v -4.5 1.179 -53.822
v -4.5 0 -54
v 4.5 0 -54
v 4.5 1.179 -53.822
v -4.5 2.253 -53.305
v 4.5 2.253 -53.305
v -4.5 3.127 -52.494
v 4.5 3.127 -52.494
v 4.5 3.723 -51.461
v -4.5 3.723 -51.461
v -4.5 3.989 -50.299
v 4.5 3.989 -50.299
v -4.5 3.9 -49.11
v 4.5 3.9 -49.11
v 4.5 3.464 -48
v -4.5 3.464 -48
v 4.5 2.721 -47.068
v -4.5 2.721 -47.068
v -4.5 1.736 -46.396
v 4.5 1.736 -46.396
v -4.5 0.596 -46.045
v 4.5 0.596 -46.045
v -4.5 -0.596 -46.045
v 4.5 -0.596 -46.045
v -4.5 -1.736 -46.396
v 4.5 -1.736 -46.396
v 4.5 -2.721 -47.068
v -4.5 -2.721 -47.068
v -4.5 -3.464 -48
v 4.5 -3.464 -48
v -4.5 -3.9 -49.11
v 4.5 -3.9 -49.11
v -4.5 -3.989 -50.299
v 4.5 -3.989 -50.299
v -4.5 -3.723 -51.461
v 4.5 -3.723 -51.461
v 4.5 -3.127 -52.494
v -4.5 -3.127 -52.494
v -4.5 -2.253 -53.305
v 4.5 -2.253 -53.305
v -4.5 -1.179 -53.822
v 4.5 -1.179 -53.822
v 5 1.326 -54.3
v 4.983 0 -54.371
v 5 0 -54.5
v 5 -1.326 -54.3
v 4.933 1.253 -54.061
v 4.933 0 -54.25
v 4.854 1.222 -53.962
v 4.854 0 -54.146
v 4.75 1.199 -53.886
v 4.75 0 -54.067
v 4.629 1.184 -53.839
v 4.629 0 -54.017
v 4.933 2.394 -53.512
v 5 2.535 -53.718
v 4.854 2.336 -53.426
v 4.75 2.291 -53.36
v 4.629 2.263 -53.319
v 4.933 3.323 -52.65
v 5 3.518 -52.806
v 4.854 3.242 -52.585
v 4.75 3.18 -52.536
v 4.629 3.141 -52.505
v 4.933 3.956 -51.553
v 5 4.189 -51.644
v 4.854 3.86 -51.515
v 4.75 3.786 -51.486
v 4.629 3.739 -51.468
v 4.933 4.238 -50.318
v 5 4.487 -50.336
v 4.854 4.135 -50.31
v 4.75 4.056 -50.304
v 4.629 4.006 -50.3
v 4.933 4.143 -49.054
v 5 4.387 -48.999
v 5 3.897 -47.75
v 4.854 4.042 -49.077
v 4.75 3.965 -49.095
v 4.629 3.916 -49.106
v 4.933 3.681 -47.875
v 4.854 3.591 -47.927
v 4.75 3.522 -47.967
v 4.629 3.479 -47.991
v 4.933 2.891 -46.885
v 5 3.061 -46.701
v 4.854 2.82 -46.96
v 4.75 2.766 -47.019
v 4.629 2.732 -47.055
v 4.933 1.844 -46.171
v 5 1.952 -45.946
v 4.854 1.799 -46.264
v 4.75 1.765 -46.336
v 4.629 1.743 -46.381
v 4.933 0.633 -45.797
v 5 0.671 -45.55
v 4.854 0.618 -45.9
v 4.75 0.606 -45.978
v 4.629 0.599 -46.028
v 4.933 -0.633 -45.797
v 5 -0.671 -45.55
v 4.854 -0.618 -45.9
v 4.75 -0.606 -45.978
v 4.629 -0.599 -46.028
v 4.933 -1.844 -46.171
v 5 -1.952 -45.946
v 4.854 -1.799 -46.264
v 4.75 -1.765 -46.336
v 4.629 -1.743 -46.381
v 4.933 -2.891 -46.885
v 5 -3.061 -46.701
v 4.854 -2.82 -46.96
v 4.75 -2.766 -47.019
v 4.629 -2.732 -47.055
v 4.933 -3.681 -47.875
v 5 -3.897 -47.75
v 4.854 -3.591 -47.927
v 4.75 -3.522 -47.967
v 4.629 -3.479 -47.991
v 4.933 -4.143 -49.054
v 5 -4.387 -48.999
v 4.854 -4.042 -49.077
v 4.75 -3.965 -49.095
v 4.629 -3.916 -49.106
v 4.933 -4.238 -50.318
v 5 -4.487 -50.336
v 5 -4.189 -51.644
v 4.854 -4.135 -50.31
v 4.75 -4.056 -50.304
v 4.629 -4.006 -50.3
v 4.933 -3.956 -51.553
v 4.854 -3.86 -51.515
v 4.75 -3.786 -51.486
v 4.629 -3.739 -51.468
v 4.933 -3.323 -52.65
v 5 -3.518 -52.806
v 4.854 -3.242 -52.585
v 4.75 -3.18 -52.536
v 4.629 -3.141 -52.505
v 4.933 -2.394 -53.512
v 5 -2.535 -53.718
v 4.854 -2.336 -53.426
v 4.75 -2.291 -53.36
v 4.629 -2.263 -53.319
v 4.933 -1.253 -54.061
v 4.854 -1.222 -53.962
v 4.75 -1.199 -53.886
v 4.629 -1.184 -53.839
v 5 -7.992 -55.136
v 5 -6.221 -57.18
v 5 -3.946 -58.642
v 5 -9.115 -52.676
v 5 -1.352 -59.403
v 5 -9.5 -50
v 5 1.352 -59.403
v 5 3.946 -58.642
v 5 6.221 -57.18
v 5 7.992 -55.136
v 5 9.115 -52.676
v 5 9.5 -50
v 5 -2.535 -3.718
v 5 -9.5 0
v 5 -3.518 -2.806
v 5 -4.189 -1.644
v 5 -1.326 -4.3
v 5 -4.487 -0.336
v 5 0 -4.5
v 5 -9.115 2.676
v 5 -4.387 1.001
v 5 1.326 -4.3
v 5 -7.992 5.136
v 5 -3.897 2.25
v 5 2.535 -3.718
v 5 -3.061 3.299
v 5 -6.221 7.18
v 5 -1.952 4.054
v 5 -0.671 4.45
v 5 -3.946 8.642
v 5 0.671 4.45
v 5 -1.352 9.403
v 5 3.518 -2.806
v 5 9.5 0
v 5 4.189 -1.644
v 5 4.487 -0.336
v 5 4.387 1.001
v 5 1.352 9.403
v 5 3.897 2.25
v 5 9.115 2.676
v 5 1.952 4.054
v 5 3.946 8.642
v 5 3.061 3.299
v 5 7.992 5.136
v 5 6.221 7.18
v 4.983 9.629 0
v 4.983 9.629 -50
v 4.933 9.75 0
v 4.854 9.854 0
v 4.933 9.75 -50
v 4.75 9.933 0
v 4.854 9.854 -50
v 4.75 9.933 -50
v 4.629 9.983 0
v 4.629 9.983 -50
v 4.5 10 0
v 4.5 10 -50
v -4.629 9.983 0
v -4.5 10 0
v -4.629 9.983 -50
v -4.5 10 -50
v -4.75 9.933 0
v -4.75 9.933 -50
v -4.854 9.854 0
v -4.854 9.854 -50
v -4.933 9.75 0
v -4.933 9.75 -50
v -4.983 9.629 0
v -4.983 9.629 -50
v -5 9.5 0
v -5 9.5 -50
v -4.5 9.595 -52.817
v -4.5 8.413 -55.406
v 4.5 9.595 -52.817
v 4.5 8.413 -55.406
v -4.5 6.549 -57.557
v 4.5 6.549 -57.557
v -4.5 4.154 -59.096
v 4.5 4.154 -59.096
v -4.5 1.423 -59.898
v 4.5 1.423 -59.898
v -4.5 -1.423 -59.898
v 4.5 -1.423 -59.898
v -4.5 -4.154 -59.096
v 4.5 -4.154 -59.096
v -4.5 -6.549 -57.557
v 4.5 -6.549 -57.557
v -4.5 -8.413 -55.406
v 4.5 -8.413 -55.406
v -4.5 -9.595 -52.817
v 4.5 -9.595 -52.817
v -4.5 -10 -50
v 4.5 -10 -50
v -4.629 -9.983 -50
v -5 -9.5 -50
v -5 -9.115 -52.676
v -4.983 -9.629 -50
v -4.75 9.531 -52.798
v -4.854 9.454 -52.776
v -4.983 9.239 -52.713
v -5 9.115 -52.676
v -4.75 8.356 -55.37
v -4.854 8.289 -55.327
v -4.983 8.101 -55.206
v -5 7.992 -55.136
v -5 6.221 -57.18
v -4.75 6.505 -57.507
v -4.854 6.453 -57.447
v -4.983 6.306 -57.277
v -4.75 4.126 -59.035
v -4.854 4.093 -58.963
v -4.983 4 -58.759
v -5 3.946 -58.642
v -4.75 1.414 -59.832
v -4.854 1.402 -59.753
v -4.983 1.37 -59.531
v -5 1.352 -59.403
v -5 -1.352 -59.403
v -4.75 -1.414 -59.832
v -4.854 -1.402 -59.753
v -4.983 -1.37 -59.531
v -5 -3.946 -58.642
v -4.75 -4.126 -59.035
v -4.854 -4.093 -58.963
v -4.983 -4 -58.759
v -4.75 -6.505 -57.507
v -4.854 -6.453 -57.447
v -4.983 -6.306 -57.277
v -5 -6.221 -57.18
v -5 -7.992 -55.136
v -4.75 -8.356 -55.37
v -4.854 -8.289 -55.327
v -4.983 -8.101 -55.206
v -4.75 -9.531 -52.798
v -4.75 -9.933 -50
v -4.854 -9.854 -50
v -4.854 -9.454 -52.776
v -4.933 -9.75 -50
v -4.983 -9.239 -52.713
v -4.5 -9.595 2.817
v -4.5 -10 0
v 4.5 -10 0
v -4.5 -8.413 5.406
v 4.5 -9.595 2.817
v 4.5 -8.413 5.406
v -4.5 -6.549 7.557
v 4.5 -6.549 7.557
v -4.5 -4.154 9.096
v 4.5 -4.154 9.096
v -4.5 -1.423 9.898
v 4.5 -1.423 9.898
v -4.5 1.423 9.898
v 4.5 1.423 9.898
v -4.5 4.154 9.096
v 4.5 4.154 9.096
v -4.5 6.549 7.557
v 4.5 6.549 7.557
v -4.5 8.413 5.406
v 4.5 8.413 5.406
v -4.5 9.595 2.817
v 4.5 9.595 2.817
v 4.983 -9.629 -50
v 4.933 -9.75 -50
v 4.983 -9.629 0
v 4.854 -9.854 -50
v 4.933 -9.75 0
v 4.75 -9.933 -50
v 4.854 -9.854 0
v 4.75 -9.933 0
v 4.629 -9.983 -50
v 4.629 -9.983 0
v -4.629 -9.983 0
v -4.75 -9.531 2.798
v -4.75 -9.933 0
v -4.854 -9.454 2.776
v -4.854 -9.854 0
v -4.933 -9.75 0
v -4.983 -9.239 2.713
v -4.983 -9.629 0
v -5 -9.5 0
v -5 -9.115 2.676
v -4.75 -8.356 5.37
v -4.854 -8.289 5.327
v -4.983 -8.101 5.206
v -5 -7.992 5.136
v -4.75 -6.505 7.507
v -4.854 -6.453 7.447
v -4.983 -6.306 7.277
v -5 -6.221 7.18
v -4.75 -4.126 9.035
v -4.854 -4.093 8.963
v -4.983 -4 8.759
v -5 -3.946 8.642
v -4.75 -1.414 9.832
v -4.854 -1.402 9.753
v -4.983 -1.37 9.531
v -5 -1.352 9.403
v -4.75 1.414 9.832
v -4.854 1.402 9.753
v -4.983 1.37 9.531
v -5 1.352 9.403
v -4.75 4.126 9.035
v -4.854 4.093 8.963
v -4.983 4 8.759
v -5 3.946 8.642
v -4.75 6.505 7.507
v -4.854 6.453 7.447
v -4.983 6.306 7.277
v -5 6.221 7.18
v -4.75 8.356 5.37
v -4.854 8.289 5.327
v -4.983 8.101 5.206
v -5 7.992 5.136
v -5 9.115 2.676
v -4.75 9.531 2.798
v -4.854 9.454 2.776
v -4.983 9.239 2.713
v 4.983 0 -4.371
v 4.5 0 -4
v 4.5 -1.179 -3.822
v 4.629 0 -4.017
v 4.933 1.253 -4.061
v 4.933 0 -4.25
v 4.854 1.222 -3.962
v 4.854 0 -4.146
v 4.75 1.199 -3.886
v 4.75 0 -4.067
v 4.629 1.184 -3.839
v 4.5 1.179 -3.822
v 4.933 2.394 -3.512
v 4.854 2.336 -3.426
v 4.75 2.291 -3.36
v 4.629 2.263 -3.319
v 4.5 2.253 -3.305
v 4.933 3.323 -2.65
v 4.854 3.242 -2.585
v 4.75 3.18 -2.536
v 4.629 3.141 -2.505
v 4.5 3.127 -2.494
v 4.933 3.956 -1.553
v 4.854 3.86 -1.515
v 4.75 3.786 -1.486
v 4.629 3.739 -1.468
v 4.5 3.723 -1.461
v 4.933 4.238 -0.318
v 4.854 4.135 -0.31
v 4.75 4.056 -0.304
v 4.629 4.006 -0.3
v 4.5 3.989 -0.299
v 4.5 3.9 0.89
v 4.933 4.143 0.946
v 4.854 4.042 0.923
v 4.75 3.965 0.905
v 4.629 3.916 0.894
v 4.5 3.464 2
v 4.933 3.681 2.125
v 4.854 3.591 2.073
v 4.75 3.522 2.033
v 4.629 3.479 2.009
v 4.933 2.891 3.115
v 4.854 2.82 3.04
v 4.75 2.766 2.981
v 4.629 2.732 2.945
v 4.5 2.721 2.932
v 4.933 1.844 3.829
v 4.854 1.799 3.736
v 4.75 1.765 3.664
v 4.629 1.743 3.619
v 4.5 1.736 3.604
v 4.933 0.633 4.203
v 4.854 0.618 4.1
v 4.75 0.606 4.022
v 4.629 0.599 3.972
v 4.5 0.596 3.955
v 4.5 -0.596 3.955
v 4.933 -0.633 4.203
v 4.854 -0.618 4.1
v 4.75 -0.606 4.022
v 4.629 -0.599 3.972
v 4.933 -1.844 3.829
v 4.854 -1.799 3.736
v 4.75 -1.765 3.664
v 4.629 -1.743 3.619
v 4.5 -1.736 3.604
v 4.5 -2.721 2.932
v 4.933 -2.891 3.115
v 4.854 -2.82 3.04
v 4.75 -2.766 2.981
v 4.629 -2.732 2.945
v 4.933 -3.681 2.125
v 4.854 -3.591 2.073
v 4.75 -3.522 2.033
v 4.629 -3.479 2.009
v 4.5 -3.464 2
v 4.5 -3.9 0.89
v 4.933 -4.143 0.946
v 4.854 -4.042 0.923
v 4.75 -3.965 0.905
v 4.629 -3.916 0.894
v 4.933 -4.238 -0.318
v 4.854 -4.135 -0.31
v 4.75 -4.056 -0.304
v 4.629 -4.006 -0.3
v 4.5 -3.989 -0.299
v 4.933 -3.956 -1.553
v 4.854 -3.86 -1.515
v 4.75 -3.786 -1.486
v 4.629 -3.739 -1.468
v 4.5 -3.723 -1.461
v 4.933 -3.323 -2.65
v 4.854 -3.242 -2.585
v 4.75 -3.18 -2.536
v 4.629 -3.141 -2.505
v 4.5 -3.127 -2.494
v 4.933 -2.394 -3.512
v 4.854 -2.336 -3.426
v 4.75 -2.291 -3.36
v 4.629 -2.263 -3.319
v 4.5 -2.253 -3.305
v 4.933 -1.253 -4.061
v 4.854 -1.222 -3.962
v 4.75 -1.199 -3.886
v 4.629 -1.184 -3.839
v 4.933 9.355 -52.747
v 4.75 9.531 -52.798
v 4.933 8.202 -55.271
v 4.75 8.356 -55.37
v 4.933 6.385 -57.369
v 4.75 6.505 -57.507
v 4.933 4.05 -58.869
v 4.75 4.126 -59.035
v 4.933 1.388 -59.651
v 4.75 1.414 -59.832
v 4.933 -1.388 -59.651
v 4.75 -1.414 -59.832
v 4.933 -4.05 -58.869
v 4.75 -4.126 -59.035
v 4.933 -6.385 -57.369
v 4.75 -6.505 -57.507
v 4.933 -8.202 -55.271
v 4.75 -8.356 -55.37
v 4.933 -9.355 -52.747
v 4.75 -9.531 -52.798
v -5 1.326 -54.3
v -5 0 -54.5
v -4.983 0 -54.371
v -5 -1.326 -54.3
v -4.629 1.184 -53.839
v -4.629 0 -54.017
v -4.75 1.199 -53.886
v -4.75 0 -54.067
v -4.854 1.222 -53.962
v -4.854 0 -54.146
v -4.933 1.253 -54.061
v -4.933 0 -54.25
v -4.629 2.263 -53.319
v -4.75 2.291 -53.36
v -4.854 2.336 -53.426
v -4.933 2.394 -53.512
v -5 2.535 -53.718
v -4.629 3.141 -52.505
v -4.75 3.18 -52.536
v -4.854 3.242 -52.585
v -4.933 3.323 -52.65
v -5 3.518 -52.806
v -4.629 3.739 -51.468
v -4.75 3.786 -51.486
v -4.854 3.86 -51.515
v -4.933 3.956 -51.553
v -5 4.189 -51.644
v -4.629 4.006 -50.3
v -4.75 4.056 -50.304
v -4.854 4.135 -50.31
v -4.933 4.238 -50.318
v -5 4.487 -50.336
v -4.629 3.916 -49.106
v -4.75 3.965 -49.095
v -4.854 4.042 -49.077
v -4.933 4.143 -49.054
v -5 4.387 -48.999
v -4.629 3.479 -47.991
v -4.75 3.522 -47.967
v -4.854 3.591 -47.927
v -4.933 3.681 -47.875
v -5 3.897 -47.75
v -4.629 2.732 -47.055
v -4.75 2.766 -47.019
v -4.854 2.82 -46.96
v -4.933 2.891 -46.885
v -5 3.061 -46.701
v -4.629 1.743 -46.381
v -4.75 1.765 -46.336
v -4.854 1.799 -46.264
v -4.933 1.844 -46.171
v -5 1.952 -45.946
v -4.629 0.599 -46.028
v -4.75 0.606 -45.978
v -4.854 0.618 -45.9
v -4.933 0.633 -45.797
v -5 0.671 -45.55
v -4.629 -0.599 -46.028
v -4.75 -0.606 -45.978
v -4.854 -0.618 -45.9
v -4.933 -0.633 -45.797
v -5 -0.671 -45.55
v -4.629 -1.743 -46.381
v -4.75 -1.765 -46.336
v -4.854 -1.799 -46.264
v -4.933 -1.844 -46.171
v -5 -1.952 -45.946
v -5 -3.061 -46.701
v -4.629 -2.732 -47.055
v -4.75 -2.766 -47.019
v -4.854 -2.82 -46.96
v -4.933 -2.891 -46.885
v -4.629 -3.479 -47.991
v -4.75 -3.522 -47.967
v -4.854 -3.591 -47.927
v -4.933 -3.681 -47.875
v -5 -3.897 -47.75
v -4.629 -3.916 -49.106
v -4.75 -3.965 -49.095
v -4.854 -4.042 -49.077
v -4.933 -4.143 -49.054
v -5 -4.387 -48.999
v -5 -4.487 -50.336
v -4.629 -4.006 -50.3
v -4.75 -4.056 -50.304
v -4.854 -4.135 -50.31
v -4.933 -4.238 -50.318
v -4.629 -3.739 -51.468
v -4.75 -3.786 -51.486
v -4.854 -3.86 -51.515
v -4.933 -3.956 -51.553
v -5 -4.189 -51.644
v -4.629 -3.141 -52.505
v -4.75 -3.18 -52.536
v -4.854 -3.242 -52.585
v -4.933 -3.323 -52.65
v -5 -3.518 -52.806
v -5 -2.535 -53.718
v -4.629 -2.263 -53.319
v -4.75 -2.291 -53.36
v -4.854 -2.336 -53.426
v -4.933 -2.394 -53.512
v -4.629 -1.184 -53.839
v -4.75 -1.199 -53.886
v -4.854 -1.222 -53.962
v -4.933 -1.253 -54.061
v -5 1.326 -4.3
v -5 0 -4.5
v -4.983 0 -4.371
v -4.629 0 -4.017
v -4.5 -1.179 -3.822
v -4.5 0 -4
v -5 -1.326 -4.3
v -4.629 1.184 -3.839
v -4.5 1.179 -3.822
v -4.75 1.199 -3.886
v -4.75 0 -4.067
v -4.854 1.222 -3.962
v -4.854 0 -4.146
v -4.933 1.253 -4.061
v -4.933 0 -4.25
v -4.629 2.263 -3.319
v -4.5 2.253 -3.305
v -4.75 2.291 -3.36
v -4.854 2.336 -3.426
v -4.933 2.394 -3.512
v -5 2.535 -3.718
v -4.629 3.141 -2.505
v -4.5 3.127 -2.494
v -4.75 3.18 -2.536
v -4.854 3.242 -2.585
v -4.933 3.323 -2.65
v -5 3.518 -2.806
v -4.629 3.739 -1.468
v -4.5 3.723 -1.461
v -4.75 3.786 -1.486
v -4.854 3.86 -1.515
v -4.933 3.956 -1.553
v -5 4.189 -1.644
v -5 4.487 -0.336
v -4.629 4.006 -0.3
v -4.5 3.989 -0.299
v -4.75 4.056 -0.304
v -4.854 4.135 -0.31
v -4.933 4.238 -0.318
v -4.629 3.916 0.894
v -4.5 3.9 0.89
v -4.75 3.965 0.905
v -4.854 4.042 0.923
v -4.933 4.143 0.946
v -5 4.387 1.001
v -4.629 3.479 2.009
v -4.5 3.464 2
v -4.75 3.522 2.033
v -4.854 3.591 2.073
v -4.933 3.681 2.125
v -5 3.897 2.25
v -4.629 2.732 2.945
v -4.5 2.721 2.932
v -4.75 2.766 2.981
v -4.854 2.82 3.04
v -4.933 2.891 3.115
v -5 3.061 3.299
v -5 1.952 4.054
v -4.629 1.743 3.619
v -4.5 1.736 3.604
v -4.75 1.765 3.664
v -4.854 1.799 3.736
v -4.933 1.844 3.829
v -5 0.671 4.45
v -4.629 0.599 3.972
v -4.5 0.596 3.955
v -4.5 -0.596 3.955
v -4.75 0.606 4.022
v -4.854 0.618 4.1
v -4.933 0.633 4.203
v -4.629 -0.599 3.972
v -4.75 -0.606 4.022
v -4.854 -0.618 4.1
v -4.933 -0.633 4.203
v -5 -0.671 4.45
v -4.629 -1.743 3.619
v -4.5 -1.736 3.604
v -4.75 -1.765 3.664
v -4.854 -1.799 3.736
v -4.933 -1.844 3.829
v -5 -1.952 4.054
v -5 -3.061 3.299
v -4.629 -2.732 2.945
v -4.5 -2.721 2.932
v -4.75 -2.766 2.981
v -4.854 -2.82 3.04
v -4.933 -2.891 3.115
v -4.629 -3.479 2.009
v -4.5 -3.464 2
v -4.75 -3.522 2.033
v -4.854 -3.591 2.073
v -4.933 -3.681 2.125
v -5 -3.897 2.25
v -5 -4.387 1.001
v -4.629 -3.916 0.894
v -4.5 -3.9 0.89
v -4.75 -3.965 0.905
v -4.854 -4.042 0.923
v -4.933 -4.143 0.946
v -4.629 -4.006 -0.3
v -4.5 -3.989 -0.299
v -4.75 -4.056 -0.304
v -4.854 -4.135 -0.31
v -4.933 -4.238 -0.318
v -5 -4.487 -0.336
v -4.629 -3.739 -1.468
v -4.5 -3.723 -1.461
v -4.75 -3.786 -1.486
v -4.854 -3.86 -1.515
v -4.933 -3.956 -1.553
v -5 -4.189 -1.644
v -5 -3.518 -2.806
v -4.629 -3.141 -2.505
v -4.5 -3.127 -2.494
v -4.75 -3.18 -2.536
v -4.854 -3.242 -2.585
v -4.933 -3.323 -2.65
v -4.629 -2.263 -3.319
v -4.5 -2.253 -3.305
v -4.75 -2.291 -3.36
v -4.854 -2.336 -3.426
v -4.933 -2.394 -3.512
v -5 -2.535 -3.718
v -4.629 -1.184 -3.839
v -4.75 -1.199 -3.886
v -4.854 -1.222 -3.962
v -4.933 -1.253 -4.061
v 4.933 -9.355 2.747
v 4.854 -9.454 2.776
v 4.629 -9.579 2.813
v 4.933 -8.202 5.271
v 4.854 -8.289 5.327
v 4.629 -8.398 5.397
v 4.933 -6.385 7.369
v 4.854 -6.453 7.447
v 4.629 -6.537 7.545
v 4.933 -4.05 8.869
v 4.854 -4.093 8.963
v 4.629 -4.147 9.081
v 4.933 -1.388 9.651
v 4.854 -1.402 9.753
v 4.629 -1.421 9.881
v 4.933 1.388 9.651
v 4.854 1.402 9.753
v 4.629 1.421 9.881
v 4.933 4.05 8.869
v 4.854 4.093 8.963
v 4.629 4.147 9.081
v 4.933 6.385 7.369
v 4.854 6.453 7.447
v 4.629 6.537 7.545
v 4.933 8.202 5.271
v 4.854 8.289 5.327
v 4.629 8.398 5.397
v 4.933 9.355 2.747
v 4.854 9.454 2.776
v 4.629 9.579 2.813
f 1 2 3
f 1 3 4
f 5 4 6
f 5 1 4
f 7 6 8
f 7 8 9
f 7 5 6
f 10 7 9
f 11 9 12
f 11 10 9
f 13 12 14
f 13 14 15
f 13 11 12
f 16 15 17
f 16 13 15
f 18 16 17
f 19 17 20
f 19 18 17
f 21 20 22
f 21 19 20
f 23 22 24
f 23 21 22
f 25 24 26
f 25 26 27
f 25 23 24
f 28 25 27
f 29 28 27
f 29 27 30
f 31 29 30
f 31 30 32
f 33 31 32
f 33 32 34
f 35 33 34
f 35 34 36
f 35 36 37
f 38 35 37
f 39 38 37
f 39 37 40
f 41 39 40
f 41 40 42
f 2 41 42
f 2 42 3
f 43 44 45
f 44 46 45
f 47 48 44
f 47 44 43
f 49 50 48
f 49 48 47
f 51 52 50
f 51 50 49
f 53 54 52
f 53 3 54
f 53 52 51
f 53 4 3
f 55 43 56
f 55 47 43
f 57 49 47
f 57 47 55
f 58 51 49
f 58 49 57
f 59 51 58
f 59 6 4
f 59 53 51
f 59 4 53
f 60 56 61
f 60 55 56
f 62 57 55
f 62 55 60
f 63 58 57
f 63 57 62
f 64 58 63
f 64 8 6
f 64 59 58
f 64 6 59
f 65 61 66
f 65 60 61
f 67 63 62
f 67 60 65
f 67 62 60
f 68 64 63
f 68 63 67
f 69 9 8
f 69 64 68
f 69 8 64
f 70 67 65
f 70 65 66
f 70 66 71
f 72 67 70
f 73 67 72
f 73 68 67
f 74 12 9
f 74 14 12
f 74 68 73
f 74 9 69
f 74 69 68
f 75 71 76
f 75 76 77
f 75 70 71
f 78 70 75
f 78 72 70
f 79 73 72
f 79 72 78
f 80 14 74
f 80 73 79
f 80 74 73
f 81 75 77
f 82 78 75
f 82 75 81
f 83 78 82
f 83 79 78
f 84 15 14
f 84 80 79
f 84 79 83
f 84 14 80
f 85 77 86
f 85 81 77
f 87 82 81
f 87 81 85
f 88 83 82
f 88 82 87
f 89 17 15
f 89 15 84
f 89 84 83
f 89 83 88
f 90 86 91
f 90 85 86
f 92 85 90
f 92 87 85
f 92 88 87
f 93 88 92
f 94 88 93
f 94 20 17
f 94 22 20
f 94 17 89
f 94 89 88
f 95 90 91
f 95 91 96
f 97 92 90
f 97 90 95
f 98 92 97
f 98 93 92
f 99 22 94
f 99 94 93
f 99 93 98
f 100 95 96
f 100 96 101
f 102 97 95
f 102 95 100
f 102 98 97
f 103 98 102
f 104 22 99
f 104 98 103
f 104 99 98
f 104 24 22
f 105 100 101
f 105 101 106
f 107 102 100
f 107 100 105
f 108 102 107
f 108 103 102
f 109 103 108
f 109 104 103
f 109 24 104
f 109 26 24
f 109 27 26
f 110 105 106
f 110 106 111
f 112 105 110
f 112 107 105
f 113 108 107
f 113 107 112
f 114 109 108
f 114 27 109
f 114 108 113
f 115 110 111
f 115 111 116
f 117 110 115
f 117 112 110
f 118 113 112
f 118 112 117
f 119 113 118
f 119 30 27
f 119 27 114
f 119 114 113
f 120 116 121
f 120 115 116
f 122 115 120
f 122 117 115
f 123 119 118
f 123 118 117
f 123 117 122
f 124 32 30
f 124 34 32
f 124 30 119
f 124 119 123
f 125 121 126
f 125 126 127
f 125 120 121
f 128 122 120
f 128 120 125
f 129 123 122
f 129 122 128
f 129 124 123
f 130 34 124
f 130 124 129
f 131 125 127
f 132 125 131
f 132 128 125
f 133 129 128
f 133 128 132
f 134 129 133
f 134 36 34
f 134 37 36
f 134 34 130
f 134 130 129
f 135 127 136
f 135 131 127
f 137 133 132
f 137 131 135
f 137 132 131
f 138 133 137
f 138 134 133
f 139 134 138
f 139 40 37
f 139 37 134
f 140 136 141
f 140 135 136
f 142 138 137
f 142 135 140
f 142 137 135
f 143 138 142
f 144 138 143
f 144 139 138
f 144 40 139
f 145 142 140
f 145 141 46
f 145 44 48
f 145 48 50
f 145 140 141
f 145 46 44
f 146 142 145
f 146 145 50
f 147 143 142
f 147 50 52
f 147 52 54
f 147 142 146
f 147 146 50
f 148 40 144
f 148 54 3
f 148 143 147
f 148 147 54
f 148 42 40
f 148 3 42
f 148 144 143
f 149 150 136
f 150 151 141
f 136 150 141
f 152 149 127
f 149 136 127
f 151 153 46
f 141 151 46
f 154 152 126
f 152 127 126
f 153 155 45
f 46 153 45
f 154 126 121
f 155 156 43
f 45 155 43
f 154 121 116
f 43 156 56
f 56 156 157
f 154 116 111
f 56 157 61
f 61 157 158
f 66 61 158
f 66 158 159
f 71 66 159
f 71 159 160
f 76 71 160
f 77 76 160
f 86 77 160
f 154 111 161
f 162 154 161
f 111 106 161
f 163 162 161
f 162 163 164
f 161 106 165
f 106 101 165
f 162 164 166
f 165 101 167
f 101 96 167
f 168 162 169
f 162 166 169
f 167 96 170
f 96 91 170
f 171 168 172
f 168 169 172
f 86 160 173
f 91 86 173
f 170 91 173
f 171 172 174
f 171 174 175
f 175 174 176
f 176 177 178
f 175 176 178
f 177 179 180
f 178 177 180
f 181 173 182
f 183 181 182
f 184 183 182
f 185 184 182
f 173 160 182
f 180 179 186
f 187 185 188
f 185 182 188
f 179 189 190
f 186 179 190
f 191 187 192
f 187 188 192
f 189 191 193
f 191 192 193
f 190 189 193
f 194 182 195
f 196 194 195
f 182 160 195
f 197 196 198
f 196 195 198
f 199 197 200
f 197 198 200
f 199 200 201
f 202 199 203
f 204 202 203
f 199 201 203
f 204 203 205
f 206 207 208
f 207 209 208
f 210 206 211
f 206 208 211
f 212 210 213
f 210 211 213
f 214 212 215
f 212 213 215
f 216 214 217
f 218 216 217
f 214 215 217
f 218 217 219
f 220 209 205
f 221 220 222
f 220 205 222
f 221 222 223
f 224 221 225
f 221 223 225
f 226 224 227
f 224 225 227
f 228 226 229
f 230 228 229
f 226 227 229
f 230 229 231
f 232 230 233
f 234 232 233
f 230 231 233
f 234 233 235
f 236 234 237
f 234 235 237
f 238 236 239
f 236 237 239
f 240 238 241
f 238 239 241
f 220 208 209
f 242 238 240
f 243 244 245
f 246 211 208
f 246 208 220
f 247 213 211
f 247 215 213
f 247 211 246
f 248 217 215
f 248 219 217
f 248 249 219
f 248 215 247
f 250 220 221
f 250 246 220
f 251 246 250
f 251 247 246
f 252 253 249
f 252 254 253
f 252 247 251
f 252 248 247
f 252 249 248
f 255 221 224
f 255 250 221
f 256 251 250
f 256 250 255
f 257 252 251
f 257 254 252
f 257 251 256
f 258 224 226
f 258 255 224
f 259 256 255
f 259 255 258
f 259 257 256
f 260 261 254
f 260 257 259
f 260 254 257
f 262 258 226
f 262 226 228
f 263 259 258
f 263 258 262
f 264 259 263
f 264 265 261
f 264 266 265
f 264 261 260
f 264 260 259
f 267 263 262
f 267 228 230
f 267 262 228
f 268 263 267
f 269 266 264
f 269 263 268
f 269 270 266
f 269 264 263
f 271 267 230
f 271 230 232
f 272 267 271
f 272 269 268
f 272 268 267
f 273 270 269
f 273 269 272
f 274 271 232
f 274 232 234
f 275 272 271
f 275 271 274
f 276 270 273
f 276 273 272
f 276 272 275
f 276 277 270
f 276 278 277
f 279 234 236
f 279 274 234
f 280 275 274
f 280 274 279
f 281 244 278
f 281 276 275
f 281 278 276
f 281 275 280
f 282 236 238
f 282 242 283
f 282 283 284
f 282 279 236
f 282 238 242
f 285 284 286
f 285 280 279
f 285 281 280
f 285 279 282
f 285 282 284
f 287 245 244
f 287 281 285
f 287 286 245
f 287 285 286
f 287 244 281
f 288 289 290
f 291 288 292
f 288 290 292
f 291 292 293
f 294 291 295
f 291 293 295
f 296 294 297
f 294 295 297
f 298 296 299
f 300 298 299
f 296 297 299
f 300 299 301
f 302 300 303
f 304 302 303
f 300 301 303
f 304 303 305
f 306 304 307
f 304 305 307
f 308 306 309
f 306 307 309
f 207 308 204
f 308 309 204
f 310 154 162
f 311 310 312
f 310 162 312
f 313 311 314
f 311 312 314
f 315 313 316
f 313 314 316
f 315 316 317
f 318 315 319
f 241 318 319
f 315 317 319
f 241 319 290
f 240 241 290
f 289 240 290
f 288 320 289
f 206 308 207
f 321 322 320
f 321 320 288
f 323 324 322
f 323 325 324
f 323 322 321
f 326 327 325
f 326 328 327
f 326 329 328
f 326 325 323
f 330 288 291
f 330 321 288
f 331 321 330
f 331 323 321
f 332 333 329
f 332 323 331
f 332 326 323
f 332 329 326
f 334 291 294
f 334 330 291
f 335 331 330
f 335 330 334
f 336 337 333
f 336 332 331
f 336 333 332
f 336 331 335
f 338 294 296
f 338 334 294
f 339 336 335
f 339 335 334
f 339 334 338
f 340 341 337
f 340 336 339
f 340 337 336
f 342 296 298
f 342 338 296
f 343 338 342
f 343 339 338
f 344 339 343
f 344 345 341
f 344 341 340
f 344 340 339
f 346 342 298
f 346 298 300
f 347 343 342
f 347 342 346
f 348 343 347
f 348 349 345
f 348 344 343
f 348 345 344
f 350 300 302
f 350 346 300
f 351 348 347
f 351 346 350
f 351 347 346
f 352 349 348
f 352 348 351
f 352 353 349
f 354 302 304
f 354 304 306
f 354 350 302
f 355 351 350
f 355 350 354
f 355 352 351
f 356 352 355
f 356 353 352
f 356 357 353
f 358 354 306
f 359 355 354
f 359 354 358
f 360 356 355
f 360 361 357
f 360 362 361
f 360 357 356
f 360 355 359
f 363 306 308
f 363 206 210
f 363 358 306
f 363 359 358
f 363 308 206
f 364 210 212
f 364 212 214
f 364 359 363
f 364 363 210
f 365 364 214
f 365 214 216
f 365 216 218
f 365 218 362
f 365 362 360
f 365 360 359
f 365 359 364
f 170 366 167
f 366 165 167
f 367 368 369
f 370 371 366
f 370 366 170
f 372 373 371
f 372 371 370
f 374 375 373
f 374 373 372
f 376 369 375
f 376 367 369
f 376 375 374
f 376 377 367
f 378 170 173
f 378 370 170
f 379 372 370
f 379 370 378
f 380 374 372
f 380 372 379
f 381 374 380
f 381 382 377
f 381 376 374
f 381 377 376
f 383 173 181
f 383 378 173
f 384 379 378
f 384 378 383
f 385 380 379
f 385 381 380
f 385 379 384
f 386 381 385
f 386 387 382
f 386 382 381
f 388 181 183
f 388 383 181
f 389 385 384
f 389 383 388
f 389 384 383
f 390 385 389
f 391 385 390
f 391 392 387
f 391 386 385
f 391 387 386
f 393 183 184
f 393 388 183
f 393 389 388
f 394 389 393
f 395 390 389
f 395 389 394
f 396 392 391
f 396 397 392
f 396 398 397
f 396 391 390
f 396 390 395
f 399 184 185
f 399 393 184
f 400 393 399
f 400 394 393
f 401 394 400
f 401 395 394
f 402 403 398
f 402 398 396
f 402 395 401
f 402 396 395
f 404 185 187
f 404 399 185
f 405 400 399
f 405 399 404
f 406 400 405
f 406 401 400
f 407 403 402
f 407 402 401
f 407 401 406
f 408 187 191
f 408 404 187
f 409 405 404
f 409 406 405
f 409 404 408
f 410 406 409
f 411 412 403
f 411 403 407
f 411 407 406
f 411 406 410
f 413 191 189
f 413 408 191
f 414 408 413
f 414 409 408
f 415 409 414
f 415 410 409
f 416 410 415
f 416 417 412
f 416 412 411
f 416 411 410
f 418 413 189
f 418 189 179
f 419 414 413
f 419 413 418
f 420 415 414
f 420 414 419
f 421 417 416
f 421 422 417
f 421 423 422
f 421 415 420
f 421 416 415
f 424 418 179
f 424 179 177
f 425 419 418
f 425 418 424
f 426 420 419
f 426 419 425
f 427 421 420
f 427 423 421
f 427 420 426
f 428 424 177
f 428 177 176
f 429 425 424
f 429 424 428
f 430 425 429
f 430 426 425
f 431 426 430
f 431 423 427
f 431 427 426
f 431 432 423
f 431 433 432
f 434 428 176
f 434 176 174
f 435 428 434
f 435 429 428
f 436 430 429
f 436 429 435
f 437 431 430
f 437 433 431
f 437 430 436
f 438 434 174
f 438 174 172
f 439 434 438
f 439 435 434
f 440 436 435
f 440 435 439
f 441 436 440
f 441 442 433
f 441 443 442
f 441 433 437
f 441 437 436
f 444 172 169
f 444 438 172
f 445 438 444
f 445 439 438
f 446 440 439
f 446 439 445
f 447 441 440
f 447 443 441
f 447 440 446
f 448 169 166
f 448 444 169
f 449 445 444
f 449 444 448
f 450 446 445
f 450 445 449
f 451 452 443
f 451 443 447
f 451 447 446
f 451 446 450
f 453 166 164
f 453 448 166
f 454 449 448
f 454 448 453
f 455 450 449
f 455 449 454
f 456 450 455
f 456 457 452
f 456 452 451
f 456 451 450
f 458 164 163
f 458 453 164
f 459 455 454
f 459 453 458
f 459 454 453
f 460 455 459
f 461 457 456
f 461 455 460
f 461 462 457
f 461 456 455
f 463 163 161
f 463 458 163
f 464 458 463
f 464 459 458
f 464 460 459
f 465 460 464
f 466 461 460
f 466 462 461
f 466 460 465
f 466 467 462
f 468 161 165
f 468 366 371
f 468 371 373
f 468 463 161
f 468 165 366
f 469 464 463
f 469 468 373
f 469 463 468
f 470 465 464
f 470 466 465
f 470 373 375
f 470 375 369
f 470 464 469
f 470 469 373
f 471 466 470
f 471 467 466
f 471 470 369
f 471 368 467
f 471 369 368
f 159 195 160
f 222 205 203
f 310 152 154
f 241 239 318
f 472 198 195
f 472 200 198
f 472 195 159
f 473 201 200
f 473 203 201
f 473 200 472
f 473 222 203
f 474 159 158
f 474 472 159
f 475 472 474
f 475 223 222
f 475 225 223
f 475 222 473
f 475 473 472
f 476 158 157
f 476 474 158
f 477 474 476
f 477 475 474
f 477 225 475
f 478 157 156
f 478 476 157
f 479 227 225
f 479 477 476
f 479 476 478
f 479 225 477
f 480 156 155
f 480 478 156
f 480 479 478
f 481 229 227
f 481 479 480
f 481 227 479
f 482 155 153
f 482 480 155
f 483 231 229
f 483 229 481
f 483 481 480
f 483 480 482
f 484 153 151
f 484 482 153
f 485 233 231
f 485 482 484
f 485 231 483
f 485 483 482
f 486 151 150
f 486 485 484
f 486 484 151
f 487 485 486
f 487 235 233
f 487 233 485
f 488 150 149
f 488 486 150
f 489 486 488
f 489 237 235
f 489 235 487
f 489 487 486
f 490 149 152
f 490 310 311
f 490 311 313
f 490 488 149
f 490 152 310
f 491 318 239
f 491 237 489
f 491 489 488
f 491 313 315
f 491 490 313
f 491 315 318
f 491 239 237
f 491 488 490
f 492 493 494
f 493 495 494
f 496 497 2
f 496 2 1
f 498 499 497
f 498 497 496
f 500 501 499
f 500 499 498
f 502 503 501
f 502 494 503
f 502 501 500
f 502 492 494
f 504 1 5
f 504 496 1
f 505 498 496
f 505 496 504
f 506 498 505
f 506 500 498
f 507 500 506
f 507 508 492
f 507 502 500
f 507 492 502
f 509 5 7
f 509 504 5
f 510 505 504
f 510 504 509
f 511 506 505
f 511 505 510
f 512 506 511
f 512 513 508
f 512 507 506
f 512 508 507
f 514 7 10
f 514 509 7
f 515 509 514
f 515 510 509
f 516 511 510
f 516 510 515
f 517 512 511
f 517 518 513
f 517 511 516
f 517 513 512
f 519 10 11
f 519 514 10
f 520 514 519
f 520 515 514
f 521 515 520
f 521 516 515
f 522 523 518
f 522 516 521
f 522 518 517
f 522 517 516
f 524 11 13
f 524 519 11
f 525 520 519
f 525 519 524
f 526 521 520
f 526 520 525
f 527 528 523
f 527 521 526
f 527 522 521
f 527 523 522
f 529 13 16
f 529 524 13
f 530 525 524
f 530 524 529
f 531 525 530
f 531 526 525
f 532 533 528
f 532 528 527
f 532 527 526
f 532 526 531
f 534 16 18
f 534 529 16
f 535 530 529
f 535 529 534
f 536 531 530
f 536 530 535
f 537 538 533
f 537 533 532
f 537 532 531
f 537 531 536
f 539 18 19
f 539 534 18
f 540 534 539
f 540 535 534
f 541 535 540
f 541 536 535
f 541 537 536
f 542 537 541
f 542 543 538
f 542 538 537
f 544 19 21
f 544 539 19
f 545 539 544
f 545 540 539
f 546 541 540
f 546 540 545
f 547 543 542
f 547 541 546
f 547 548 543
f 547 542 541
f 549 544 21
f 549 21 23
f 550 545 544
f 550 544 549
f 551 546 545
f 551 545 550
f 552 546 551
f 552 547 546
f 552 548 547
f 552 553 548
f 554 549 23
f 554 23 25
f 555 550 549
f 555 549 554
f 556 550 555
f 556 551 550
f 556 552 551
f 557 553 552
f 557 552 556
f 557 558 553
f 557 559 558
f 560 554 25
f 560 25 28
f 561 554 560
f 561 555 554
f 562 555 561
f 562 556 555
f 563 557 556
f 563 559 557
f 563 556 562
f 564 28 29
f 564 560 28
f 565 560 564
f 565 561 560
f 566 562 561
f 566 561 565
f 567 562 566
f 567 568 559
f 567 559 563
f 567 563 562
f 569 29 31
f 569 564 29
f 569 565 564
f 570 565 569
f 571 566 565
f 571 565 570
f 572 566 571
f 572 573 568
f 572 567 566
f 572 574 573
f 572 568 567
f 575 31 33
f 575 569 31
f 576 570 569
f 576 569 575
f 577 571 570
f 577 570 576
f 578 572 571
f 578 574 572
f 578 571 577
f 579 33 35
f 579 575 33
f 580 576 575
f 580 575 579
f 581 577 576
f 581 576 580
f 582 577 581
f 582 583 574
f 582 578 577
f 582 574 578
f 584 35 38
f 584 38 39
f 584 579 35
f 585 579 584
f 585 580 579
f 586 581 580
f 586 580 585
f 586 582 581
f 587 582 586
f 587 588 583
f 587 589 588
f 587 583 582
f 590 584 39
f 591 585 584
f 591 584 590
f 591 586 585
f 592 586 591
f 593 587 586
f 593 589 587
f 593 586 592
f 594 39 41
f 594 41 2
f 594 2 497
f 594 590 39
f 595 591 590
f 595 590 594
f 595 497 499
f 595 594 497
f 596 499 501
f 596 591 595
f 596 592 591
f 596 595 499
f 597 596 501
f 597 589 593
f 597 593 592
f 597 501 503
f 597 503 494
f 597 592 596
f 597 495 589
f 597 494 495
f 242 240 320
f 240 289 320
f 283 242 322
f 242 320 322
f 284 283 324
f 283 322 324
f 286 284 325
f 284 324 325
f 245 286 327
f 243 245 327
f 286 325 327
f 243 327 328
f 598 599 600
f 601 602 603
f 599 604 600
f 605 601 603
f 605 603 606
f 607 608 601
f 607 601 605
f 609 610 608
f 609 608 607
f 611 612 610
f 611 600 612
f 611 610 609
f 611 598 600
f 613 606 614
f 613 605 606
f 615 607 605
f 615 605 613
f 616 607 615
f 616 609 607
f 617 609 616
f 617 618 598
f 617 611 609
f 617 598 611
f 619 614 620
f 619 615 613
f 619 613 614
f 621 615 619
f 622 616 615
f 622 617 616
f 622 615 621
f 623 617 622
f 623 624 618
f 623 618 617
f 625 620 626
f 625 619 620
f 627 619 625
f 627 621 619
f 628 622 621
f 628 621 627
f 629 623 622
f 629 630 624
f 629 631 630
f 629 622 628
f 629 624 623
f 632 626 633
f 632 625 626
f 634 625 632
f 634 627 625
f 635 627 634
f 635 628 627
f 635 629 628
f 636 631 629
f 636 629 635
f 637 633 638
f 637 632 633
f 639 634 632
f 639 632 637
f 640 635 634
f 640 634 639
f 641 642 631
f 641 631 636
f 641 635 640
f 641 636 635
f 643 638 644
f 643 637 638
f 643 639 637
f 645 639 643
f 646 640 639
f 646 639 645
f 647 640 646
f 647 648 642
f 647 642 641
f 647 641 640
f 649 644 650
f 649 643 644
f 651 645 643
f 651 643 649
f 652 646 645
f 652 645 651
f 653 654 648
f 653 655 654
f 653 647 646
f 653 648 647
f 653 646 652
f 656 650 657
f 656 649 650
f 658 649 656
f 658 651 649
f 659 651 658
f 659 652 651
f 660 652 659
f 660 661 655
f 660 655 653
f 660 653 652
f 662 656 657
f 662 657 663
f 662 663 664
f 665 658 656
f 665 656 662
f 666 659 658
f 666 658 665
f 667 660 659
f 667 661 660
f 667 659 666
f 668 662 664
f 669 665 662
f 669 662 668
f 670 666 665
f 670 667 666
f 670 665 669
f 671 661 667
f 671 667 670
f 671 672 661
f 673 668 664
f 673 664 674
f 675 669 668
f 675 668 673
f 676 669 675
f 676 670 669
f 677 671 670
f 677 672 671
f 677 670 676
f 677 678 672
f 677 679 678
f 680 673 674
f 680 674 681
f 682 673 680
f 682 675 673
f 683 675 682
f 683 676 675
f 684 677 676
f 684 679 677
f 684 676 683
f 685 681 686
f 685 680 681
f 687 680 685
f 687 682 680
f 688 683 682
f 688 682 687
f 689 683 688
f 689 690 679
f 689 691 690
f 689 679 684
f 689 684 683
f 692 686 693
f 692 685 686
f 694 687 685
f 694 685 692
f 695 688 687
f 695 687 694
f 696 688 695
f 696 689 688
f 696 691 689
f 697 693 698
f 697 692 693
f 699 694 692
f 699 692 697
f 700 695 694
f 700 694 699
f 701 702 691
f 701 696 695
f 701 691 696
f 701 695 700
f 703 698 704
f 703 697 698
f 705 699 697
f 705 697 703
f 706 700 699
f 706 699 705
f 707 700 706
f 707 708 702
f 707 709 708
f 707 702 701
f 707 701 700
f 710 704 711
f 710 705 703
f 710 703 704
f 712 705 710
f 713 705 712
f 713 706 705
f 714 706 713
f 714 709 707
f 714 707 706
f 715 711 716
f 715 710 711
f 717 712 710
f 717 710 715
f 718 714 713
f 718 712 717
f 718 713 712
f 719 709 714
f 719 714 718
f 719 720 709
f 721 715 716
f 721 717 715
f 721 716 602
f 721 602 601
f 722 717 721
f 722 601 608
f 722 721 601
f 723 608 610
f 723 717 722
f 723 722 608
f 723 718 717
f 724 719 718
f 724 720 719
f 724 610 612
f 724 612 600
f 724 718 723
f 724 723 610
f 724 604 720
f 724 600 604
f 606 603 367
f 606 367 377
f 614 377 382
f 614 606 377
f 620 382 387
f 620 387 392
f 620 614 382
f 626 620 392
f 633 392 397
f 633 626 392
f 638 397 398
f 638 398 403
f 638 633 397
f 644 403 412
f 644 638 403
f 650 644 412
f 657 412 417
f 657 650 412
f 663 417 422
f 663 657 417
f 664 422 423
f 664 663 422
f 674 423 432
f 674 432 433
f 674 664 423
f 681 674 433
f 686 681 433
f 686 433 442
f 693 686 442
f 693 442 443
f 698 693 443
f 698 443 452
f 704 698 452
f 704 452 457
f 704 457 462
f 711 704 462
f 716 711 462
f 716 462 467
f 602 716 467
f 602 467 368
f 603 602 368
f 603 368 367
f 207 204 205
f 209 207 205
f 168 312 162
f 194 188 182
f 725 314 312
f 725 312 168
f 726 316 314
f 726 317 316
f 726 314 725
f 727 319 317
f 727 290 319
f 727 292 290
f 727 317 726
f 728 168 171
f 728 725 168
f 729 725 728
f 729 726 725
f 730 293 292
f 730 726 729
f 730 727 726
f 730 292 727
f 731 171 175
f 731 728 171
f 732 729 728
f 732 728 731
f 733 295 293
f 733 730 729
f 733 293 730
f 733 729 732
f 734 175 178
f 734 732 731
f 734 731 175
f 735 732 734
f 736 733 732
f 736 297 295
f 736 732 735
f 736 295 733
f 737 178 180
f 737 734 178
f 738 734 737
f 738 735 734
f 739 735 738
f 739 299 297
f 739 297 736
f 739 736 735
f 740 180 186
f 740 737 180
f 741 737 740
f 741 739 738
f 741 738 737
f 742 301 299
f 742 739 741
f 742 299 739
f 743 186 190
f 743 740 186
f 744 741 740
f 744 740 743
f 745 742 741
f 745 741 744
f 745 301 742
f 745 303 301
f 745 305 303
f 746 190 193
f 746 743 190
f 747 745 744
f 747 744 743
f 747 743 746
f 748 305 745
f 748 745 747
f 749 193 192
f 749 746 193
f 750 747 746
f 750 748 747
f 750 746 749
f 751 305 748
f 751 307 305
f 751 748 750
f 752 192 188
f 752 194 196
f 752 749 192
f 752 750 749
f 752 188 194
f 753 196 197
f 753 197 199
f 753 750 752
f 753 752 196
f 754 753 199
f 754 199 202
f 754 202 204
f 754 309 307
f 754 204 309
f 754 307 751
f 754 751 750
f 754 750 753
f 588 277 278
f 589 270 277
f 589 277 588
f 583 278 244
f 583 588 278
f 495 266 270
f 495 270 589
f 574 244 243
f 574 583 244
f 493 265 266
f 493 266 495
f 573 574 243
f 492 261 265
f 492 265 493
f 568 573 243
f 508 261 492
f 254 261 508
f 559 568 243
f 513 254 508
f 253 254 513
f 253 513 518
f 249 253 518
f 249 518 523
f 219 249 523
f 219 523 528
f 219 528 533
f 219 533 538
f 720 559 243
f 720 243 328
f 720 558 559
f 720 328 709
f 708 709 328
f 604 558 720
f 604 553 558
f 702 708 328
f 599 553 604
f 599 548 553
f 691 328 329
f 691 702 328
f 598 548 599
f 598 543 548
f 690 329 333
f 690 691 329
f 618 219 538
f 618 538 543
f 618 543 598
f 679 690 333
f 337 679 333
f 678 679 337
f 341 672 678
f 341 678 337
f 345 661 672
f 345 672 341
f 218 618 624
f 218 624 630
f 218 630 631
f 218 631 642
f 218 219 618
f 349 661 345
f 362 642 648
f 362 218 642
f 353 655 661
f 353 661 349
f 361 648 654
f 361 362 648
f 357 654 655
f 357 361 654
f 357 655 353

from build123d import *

# Parameters (mm, degrees)
SKETCH_1_R      = 4
EXTRUDE_1_DEPTH = 5
FILLET_1_R      = 0.5


with BuildPart() as part:
    # 草图1 → 凸台-拉伸1 (new, symmetric)
    with BuildSketch(Plane(origin=(0, 0, 0), x_dir=(0, 0, -1), z_dir=(1, 0, 0))):
        with BuildLine():
            Line((0, 10), (50, 10))
            ThreePointArc((50, 10), (60, 0), (50, -10))
            Line((50, -10), (0, -10))
            ThreePointArc((0, -10), (-10, 0), (0, 10))
        make_face()
        Circle(SKETCH_1_R, mode=Mode.SUBTRACT)
        with Locations((50, 0)):
            Circle(SKETCH_1_R, mode=Mode.SUBTRACT)
    extrude(amount=EXTRUDE_1_DEPTH, both=True)

    # 圆角1
    fillet_1_edges = [part.edges().sort_by_distance(p)[0] for p in [
        (-5, 0, 4),
        (5, 0, 4),
        (5, 0, -60),
        (-5, 0, -46),
        (5, 0, -46),
        (5, 10, -25),
        (5, 0, 10),
        (-5, 10, -25),
        (-5, 0, -60),
        (-5, -10, -25),
        (-5, 0, 10),
        (5, -10, -25),
    ]]
    fillet(fillet_1_edges, radius=FILLET_1_R)


solid = part.part
